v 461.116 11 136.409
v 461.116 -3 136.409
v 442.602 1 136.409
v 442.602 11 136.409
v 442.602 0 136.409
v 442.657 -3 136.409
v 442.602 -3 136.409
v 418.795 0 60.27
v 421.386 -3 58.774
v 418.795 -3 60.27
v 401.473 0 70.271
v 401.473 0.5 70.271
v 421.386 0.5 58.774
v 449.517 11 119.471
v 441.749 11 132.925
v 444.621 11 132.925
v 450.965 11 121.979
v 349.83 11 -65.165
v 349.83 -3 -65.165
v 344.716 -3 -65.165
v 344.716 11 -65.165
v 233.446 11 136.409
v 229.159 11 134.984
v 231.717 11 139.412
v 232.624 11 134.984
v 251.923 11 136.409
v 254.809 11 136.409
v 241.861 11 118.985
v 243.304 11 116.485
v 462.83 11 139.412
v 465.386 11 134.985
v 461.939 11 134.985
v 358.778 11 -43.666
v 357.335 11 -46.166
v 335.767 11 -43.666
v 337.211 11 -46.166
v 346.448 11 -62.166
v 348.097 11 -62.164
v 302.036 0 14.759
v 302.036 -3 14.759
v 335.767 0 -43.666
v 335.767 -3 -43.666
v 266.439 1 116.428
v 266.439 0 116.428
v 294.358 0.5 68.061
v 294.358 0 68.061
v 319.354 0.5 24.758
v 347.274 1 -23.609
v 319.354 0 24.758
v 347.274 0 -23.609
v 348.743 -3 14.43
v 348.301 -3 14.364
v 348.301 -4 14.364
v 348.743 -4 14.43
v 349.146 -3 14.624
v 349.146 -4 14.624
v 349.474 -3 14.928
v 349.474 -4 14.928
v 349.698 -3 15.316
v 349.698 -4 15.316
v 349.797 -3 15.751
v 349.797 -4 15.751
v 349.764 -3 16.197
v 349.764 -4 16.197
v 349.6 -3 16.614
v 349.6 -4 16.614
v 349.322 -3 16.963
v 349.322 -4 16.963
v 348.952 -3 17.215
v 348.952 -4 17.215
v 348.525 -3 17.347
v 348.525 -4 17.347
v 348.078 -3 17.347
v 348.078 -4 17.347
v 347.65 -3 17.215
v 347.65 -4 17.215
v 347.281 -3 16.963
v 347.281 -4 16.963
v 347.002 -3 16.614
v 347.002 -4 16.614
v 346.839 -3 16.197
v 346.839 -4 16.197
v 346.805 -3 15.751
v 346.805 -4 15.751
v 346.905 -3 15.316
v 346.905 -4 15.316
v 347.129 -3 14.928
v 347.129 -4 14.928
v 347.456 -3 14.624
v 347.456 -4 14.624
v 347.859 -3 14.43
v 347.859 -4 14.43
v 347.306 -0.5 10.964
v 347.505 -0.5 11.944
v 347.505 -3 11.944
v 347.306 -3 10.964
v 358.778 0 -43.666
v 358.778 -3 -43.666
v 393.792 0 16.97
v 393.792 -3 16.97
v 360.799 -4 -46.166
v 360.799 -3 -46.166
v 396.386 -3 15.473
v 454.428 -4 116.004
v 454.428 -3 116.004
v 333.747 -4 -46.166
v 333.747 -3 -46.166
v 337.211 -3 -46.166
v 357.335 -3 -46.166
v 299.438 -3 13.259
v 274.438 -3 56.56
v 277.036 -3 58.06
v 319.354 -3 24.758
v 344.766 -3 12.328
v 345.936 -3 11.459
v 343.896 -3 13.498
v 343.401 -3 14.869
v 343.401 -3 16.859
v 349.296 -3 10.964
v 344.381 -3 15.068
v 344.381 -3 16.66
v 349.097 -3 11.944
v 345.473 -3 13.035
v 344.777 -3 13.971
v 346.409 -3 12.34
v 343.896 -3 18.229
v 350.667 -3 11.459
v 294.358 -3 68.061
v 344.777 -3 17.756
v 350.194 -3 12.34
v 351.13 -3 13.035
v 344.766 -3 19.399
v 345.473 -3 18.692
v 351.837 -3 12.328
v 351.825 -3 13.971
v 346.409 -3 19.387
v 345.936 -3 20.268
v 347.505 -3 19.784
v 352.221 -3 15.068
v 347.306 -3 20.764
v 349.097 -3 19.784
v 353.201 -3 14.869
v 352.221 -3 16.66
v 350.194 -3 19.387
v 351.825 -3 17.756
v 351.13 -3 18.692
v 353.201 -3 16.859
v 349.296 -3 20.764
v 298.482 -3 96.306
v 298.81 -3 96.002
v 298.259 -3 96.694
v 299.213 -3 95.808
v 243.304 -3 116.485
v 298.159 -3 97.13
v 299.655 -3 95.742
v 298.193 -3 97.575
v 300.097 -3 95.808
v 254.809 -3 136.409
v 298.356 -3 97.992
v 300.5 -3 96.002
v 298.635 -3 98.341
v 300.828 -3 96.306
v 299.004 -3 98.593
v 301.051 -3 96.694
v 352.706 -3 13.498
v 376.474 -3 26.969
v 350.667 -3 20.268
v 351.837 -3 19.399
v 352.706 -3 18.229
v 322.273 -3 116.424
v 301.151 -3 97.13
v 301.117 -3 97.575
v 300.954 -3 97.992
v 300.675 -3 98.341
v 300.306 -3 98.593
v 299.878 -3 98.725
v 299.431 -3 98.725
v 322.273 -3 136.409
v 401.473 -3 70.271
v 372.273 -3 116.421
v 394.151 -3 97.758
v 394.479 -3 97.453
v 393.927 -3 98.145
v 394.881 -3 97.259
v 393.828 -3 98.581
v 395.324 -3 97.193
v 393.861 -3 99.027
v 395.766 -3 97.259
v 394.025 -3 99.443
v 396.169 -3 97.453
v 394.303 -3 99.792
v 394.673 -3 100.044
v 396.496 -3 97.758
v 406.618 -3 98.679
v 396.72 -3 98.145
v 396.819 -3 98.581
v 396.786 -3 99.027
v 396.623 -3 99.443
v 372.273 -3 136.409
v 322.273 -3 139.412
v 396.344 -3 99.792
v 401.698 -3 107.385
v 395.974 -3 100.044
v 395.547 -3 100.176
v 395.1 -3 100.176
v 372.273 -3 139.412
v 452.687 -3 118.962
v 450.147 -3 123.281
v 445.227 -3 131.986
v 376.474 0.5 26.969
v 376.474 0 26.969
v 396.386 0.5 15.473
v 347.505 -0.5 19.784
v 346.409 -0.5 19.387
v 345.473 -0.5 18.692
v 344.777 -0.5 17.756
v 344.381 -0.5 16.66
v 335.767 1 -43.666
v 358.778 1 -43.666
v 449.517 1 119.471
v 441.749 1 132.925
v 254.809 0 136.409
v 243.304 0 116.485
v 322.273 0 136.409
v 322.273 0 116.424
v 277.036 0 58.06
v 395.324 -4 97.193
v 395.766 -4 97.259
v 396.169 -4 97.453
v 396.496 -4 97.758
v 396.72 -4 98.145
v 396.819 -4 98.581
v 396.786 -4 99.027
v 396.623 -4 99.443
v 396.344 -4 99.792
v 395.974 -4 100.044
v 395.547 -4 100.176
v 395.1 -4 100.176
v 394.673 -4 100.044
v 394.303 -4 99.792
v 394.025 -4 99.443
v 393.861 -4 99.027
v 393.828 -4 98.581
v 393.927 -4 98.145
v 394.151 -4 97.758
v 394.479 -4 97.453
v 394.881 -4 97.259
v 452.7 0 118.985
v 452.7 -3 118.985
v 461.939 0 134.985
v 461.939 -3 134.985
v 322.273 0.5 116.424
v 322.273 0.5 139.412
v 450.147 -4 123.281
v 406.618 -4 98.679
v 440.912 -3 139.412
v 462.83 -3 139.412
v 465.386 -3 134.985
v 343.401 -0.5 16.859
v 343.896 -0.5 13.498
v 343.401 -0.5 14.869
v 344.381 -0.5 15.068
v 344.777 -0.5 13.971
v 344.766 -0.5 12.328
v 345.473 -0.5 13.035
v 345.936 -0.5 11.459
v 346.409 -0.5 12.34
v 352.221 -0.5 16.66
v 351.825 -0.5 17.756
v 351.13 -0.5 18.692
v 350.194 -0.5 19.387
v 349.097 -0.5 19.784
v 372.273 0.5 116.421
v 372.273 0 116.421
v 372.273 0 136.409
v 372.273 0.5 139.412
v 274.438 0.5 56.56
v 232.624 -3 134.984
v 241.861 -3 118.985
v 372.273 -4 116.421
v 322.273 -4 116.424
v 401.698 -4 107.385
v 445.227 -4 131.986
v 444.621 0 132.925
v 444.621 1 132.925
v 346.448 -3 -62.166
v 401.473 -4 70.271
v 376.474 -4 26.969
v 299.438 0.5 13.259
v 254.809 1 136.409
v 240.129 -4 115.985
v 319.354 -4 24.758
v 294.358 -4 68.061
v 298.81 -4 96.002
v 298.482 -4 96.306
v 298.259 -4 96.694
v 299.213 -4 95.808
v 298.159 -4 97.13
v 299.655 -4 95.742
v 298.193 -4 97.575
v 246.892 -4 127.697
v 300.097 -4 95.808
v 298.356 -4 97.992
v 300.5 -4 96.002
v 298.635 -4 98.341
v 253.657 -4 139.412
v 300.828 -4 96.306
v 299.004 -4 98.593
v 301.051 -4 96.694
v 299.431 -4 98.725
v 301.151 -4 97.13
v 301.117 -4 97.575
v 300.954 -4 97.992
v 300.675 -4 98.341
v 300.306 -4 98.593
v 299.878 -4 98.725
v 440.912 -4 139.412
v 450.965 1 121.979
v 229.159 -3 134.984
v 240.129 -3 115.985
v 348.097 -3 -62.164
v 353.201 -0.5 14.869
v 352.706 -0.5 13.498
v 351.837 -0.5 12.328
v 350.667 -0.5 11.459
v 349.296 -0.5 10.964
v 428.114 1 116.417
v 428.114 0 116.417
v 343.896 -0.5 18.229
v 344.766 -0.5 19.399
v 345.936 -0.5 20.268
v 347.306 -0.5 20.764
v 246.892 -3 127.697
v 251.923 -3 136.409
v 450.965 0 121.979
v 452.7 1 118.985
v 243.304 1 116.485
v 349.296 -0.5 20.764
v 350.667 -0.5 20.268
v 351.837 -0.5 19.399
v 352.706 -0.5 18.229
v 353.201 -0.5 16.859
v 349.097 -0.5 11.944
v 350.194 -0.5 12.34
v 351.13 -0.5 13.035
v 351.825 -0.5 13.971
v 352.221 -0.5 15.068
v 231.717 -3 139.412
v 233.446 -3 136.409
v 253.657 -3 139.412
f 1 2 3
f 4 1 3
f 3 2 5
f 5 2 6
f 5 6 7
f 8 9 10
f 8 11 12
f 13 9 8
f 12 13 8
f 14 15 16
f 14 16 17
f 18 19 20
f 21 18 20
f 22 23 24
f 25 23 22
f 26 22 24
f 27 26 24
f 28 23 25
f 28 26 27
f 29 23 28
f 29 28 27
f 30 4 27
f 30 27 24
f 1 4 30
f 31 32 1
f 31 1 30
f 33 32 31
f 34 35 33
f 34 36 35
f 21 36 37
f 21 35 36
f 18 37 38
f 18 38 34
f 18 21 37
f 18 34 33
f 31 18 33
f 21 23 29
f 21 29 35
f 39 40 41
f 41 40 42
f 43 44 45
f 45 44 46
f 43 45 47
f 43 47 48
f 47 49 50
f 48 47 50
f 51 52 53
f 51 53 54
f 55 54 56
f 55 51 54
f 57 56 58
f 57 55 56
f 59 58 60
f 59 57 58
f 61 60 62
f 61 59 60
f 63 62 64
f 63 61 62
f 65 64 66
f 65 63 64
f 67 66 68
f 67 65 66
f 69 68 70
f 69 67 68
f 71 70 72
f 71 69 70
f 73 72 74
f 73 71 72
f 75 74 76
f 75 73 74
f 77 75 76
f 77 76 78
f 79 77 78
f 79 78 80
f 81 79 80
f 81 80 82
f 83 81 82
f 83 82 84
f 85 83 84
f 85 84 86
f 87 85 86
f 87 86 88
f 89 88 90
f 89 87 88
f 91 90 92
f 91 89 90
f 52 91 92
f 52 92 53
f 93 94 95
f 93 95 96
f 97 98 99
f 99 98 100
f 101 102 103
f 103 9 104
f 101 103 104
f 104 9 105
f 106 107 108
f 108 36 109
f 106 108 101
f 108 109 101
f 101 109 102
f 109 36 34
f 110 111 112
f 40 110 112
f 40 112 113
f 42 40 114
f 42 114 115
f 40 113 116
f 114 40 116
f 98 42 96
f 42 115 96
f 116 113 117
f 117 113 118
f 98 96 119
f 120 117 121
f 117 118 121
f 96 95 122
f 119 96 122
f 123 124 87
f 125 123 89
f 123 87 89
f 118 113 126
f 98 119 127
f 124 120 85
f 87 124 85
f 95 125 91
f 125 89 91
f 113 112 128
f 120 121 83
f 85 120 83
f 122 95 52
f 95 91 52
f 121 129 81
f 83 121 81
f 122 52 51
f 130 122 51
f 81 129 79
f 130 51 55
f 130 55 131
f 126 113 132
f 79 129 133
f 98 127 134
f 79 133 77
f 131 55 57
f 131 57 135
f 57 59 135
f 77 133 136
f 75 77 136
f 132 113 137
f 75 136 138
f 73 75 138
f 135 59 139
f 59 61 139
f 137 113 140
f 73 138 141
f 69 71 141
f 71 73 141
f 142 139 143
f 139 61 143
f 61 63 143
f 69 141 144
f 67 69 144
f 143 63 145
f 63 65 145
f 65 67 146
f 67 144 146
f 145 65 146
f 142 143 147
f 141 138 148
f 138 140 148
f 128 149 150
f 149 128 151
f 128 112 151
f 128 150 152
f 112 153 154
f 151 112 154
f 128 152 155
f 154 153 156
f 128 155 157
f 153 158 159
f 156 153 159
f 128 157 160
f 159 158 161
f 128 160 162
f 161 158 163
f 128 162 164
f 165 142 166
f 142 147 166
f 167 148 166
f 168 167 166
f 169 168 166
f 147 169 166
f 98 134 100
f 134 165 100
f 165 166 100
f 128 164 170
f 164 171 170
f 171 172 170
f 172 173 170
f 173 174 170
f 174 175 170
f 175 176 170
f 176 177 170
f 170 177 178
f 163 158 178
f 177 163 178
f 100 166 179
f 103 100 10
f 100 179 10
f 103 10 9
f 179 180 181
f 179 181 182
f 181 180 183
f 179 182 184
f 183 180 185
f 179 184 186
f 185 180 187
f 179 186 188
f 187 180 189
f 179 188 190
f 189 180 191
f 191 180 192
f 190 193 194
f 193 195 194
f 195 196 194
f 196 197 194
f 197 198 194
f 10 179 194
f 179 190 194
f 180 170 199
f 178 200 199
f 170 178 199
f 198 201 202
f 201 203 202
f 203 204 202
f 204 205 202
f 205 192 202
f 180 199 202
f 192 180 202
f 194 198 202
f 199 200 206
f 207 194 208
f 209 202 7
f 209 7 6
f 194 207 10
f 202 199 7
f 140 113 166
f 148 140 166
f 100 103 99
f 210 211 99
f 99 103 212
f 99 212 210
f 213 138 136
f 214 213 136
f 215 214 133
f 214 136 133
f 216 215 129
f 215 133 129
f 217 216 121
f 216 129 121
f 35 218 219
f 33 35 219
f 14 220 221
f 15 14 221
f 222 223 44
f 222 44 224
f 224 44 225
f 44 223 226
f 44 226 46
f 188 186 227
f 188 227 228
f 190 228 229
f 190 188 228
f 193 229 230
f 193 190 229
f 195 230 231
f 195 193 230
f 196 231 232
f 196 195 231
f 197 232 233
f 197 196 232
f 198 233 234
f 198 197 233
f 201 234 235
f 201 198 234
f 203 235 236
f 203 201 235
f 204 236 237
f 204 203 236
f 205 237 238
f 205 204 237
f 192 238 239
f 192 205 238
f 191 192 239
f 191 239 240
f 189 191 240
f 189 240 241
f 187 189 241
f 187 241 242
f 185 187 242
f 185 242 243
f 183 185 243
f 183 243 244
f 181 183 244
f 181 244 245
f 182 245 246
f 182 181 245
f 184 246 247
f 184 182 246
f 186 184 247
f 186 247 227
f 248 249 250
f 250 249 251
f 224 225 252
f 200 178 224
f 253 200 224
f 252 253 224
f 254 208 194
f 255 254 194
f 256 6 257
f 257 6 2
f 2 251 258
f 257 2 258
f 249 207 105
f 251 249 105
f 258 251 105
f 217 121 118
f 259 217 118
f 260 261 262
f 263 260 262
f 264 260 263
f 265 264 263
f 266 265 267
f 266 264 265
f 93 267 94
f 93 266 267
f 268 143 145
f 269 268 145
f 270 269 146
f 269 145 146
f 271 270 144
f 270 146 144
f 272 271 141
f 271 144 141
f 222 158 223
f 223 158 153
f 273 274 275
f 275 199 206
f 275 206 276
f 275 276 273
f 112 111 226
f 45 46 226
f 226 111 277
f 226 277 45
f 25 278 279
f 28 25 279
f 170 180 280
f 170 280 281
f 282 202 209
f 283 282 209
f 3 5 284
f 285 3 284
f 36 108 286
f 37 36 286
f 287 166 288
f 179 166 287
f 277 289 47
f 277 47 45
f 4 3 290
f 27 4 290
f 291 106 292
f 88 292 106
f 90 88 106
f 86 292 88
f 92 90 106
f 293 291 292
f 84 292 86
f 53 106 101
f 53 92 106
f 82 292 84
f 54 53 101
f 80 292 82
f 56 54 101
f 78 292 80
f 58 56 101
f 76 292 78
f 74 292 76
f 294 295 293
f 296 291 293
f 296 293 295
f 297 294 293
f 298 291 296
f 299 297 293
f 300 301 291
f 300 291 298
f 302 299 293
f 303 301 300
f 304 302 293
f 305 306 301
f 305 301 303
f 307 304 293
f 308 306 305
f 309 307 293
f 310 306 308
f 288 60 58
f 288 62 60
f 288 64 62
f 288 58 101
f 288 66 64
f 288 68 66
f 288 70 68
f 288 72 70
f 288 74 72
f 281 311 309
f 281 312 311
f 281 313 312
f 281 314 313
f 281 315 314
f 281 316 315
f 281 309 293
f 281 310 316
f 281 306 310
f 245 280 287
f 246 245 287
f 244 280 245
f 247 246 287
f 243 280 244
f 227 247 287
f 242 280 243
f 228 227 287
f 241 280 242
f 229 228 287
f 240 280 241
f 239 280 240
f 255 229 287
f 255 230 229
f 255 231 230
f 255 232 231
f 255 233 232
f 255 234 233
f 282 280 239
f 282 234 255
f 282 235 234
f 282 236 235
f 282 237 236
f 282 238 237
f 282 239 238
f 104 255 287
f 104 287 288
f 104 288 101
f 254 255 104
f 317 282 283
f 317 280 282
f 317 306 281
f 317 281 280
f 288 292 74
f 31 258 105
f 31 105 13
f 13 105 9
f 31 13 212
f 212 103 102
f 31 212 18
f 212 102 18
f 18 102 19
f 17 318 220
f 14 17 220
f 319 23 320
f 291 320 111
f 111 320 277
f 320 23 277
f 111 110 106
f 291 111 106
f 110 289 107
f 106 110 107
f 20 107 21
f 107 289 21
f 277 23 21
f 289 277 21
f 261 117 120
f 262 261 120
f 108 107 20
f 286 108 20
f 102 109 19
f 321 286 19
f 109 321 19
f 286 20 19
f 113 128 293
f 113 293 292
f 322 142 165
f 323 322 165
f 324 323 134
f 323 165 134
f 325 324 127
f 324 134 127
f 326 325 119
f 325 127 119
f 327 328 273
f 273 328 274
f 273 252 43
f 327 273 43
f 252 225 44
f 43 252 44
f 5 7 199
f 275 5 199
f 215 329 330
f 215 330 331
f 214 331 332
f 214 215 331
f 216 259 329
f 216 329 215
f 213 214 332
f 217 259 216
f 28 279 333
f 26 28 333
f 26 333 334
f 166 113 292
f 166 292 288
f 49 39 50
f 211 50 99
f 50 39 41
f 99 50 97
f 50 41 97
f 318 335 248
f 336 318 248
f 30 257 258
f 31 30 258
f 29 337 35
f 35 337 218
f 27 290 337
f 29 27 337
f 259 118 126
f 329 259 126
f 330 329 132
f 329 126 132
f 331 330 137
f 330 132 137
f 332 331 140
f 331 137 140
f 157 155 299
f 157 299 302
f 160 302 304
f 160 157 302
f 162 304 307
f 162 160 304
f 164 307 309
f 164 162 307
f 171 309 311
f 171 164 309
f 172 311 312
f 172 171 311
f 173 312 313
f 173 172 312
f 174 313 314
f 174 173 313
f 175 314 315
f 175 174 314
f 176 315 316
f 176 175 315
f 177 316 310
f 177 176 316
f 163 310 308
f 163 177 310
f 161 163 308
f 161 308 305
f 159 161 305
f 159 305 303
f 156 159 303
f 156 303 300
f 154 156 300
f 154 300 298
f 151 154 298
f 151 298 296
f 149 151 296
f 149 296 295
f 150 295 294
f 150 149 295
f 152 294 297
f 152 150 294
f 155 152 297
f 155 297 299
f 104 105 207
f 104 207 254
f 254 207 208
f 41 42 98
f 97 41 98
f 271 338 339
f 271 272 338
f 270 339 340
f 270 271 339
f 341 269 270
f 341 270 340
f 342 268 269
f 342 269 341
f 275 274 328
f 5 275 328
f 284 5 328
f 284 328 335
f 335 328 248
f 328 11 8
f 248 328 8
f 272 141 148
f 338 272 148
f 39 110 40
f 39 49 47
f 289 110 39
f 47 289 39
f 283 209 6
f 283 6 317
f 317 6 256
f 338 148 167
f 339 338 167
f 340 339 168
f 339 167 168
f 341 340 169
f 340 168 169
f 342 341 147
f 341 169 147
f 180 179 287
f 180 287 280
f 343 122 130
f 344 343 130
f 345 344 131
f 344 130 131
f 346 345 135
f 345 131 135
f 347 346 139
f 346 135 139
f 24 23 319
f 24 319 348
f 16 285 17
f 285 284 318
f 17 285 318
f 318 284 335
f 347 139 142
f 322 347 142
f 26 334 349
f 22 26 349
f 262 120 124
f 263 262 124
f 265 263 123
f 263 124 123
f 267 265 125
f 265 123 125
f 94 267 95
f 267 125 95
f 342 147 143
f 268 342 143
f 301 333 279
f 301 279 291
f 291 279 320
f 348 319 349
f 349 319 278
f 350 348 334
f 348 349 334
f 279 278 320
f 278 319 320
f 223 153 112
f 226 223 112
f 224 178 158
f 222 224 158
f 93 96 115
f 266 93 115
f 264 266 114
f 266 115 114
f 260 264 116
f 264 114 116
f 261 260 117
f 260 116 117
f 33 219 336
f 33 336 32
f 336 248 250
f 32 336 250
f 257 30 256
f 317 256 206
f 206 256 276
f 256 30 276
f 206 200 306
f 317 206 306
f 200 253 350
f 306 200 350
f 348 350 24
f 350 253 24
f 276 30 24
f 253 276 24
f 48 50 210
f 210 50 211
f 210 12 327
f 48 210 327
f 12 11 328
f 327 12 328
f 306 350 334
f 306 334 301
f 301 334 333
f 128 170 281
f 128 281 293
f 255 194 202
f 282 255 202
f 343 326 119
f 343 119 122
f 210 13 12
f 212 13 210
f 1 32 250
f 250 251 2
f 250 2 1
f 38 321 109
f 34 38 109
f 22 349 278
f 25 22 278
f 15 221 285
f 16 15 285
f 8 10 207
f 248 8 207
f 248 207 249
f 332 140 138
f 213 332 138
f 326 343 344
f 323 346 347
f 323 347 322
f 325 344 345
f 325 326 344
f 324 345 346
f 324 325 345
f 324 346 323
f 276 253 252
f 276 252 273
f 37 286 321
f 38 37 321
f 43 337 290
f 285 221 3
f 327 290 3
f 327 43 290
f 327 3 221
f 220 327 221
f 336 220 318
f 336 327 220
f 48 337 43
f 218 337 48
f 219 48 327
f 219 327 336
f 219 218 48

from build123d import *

# Parameters (mm, degrees)
BOSS_EXTRUDE1_DEPTH      = 1
BOSS_EXTRUDE2_DEPTH      = 11
BOSS_EXTRUDE3_DEPTH      = 5
BOSS_EXTRUDE3_DEPTH_BACK = 3
SKETCH3_W                = 50
SKETCH3_H                = 7
CUT_EXTRUDE3_DEPTH       = 25
SKETCH5_W                = 50
SKETCH5_H                = 7
CUT_EXTRUDE4_DEPTH       = 25
SKETCH6_W                = 50
SKETCH6_H                = 7
CUT_EXTRUDE5_DEPTH       = 25
SKETCH8_R                = 1.5
BOSS_EXTRUDE5_DEPTH      = 1
BOSS_EXTRUDE7_DEPTH      = 2.5


with BuildPart() as part:
    # Sketch1 → Boss-Extrude1 (new body)
    with BuildSketch(Plane(origin=(0, 0, 0), x_dir=(1, 0, 0), z_dir=(0, 1, 0))):
        Polygon((243.304219773, -116.484791866), (254.809280576, -136.408896139), (442.602090749, -136.409305398), (444.621046679, -132.925433223), (441.749040748, -132.925433223), (449.516726723, -119.471406457), (450.964695297, -121.978953122), (452.699916621, -118.984688017), (358.778179035, 43.666038066), (335.767496284, 43.666038066), align=None)
        Polygon((428.113670919, -116.417164681), (266.439108268, -116.428009241), (347.273609729, 23.609230825), align=None, mode=Mode.SUBTRACT)
    extrude(amount=BOSS_EXTRUDE1_DEPTH)

    # Sketch1<9> → Boss-Extrude2 (add)
    # profile 1 of 2: a face of its own
    with BuildSketch(Plane(origin=(0, 0, 0), x_dir=(1, 0, 0), z_dir=(0, 1, 0))):
        Polygon((229.159432547, -134.984249184), (231.716666588, -139.412373829), (462.829865412, -139.412373829), (465.38624875, -134.984588004), (349.829542096, 65.165499075), (344.716133219, 65.165499075), align=None)
        Polygon((251.922647988, -136.4093054), (233.446303399, -136.408896139), (232.623553959, -134.984217358), (241.860901688, -118.984688019), align=None, mode=Mode.SUBTRACT)
        Polygon((442.602090749, -136.409305398), (254.809280576, -136.408896139), (243.304219773, -116.484791866), (335.767496284, 43.666038066), (358.778179035, 43.666038066), (461.938967957, -134.984588004), (461.116393748, -136.409305398), align=None, mode=Mode.SUBTRACT)
        Polygon((348.096628302, 62.164013367), (357.334800991, 46.166038067), (337.210874326, 46.166038067), (346.44844193, 62.165948237), align=None, mode=Mode.SUBTRACT)
    # profile 2 of 2: a face of its own
    with BuildSketch(Plane(origin=(0, 0, 0), x_dir=(1, 0, 0), z_dir=(0, 1, 0))):
        Polygon((441.749040748, -132.925433223), (444.621046679, -132.925433223), (450.964695297, -121.978953122), (449.516726723, -119.471406457), align=None)
    extrude(amount=BOSS_EXTRUDE2_DEPTH)

    # Sketch1<10> → Boss-Extrude3 (add, two sides: drawn at the far end of the back side and taken through both)
    with BuildSketch(Plane(origin=(0, 0, 0), x_dir=(1, 0, 0), z_dir=(0, 1, 0)).offset(-BOSS_EXTRUDE3_DEPTH_BACK)):
        Polygon((229.159432547, -134.984249184), (231.716666588, -139.412373829), (462.829865412, -139.412373829), (465.38624875, -134.984588004), (349.829542096, 65.165499075), (344.716133219, 65.165499075), align=None)
        Polygon((251.922647988, -136.4093054), (233.446303399, -136.408896139), (232.623553959, -134.984217358), (241.860901688, -118.984688019), align=None, mode=Mode.SUBTRACT)
        Polygon((442.602090749, -136.409305398), (254.809280576, -136.408896139), (243.304219773, -116.484791866), (335.767496284, 43.666038066), (358.778179035, 43.666038066), (452.699916621, -118.984688017), (461.938967957, -134.984588004), (461.116393748, -136.409305398), align=None, mode=Mode.SUBTRACT)
        Polygon((348.096628302, 62.164013367), (357.334800991, 46.166038067), (337.210874326, 46.166038067), (346.44844193, 62.165948237), align=None, mode=Mode.SUBTRACT)
    extrude(amount=BOSS_EXTRUDE3_DEPTH + BOSS_EXTRUDE3_DEPTH_BACK)

    # Sketch3 → Cut-Extrude3 (cut)
    with BuildSketch(Plane(origin=(290.589645397, 0, -167.772009994), x_dir=(-0.49999999999998745, 0, -0.8660254037844459), z_dir=(0.8660254037844459, 0, -0.49999999999998745))):
        with Locations((-236.592990632, -3)):
            Rectangle(SKETCH3_W, SKETCH3_H)
    extrude(amount=-CUT_EXTRUDE3_DEPTH, mode=Mode.SUBTRACT)

    # Sketch5 → Cut-Extrude4 (cut)
    with BuildSketch(Plane.XY.offset(139.412373829)):
        with Locations((347.273266, -3)):
            Rectangle(SKETCH5_W, SKETCH5_H)
    extrude(amount=-CUT_EXTRUDE4_DEPTH, mode=Mode.SUBTRACT)

    # Sketch6 → Cut-Extrude5 (cut)
    with BuildSketch(Plane(origin=(230.319375797, 0, 132.975171838), x_dir=(-0.5000006154012504, 0, 0.8660250484820695), z_dir=(-0.8660250484820695, 0, -0.5000006154012504))):
        with Locations((-113.2366748, -3)):
            Rectangle(SKETCH6_W, SKETCH6_H)
    extrude(amount=-CUT_EXTRUDE5_DEPTH, mode=Mode.SUBTRACT)

    # Sketch8 → Boss-Extrude5 (add)
    with BuildSketch(Plane.XZ.offset(3)):
        Polygon((246.891774838, 127.696996709), (240.128710529, 115.984933576), (333.74677129, -46.166038067), (360.798886024, -46.166038067), (454.427535986, 116.00354071), (450.14703547, 123.280701064), (406.618322212, 98.678849058), (401.697951811, 107.384591709), (445.226665069, 131.986443715), (440.912417704, 139.412373829), (253.656752788, 139.412373829), align=None)
        with Locations((395.323540807, 98.692824234)):
            Circle(SKETCH8_R, mode=Mode.SUBTRACT)
        with Locations((348.301285092, 15.863526629)):
            Circle(SKETCH8_R, mode=Mode.SUBTRACT)
        with Locations((299.654911442, 97.241681781)):
            Circle(SKETCH8_R, mode=Mode.SUBTRACT)
        Polygon((322.273266, 116.424264082), (294.358218631, 68.061097964), (319.354499366, 24.757680453), (376.473657317, 26.969372805), (401.47267951, 70.271207531), (372.273266, 116.420910258), align=None, mode=Mode.SUBTRACT)
    extrude(amount=BOSS_EXTRUDE5_DEPTH)

    # Sketch12 → Boss-Extrude7 (add)
    with BuildSketch(Plane(origin=(0, -3, 0), x_dir=(1, 0, 0), z_dir=(0, 1, 0))):
        with BuildLine():
            ThreePointArc((353.201285092, -14.868539192), (351.836818997, -12.327992723), (349.296272529, -10.963526629))
            Line((349.296272529, -10.963526629), (349.097275041, -11.943526629))
            ThreePointArc((349.097275041, -11.943526629), (351.129712216, -13.035099504), (352.221285092, -15.067536679))
            Line((352.221285092, -15.067536679), (353.201285092, -14.868539192))
        make_face()
        with BuildLine():
            Line((347.505295142, -11.943526629), (347.306297654, -10.963526629))
            ThreePointArc((347.306297654, -10.963526629), (344.765751186, -12.327992723), (343.401285092, -14.868539192))
            Line((343.401285092, -14.868539192), (344.381285092, -15.067536679))
            ThreePointArc((344.381285092, -15.067536679), (345.472857967, -13.035099504), (347.505295142, -11.943526629))
        make_face()
        with BuildLine():
            ThreePointArc((349.296272529, -20.763526629), (351.836818997, -19.399060535), (353.201285092, -16.858514066))
            Line((353.201285092, -16.858514066), (352.221285092, -16.659516578))
            ThreePointArc((352.221285092, -16.659516578), (351.129712216, -18.691953754), (349.097275041, -19.783526629))
            Line((349.097275041, -19.783526629), (349.296272529, -20.763526629))
        make_face()
        with BuildLine():
            Line((344.381285092, -16.659516578), (343.401285092, -16.858514066))
            ThreePointArc((343.401285092, -16.858514066), (344.765751186, -19.399060535), (347.306297654, -20.763526629))
            Line((347.306297654, -20.763526629), (347.505295142, -19.783526629))
            ThreePointArc((347.505295142, -19.783526629), (345.472857967, -18.691953754), (344.381285092, -16.659516578))
        make_face()
    extrude(amount=BOSS_EXTRUDE7_DEPTH)


solid = part.part
